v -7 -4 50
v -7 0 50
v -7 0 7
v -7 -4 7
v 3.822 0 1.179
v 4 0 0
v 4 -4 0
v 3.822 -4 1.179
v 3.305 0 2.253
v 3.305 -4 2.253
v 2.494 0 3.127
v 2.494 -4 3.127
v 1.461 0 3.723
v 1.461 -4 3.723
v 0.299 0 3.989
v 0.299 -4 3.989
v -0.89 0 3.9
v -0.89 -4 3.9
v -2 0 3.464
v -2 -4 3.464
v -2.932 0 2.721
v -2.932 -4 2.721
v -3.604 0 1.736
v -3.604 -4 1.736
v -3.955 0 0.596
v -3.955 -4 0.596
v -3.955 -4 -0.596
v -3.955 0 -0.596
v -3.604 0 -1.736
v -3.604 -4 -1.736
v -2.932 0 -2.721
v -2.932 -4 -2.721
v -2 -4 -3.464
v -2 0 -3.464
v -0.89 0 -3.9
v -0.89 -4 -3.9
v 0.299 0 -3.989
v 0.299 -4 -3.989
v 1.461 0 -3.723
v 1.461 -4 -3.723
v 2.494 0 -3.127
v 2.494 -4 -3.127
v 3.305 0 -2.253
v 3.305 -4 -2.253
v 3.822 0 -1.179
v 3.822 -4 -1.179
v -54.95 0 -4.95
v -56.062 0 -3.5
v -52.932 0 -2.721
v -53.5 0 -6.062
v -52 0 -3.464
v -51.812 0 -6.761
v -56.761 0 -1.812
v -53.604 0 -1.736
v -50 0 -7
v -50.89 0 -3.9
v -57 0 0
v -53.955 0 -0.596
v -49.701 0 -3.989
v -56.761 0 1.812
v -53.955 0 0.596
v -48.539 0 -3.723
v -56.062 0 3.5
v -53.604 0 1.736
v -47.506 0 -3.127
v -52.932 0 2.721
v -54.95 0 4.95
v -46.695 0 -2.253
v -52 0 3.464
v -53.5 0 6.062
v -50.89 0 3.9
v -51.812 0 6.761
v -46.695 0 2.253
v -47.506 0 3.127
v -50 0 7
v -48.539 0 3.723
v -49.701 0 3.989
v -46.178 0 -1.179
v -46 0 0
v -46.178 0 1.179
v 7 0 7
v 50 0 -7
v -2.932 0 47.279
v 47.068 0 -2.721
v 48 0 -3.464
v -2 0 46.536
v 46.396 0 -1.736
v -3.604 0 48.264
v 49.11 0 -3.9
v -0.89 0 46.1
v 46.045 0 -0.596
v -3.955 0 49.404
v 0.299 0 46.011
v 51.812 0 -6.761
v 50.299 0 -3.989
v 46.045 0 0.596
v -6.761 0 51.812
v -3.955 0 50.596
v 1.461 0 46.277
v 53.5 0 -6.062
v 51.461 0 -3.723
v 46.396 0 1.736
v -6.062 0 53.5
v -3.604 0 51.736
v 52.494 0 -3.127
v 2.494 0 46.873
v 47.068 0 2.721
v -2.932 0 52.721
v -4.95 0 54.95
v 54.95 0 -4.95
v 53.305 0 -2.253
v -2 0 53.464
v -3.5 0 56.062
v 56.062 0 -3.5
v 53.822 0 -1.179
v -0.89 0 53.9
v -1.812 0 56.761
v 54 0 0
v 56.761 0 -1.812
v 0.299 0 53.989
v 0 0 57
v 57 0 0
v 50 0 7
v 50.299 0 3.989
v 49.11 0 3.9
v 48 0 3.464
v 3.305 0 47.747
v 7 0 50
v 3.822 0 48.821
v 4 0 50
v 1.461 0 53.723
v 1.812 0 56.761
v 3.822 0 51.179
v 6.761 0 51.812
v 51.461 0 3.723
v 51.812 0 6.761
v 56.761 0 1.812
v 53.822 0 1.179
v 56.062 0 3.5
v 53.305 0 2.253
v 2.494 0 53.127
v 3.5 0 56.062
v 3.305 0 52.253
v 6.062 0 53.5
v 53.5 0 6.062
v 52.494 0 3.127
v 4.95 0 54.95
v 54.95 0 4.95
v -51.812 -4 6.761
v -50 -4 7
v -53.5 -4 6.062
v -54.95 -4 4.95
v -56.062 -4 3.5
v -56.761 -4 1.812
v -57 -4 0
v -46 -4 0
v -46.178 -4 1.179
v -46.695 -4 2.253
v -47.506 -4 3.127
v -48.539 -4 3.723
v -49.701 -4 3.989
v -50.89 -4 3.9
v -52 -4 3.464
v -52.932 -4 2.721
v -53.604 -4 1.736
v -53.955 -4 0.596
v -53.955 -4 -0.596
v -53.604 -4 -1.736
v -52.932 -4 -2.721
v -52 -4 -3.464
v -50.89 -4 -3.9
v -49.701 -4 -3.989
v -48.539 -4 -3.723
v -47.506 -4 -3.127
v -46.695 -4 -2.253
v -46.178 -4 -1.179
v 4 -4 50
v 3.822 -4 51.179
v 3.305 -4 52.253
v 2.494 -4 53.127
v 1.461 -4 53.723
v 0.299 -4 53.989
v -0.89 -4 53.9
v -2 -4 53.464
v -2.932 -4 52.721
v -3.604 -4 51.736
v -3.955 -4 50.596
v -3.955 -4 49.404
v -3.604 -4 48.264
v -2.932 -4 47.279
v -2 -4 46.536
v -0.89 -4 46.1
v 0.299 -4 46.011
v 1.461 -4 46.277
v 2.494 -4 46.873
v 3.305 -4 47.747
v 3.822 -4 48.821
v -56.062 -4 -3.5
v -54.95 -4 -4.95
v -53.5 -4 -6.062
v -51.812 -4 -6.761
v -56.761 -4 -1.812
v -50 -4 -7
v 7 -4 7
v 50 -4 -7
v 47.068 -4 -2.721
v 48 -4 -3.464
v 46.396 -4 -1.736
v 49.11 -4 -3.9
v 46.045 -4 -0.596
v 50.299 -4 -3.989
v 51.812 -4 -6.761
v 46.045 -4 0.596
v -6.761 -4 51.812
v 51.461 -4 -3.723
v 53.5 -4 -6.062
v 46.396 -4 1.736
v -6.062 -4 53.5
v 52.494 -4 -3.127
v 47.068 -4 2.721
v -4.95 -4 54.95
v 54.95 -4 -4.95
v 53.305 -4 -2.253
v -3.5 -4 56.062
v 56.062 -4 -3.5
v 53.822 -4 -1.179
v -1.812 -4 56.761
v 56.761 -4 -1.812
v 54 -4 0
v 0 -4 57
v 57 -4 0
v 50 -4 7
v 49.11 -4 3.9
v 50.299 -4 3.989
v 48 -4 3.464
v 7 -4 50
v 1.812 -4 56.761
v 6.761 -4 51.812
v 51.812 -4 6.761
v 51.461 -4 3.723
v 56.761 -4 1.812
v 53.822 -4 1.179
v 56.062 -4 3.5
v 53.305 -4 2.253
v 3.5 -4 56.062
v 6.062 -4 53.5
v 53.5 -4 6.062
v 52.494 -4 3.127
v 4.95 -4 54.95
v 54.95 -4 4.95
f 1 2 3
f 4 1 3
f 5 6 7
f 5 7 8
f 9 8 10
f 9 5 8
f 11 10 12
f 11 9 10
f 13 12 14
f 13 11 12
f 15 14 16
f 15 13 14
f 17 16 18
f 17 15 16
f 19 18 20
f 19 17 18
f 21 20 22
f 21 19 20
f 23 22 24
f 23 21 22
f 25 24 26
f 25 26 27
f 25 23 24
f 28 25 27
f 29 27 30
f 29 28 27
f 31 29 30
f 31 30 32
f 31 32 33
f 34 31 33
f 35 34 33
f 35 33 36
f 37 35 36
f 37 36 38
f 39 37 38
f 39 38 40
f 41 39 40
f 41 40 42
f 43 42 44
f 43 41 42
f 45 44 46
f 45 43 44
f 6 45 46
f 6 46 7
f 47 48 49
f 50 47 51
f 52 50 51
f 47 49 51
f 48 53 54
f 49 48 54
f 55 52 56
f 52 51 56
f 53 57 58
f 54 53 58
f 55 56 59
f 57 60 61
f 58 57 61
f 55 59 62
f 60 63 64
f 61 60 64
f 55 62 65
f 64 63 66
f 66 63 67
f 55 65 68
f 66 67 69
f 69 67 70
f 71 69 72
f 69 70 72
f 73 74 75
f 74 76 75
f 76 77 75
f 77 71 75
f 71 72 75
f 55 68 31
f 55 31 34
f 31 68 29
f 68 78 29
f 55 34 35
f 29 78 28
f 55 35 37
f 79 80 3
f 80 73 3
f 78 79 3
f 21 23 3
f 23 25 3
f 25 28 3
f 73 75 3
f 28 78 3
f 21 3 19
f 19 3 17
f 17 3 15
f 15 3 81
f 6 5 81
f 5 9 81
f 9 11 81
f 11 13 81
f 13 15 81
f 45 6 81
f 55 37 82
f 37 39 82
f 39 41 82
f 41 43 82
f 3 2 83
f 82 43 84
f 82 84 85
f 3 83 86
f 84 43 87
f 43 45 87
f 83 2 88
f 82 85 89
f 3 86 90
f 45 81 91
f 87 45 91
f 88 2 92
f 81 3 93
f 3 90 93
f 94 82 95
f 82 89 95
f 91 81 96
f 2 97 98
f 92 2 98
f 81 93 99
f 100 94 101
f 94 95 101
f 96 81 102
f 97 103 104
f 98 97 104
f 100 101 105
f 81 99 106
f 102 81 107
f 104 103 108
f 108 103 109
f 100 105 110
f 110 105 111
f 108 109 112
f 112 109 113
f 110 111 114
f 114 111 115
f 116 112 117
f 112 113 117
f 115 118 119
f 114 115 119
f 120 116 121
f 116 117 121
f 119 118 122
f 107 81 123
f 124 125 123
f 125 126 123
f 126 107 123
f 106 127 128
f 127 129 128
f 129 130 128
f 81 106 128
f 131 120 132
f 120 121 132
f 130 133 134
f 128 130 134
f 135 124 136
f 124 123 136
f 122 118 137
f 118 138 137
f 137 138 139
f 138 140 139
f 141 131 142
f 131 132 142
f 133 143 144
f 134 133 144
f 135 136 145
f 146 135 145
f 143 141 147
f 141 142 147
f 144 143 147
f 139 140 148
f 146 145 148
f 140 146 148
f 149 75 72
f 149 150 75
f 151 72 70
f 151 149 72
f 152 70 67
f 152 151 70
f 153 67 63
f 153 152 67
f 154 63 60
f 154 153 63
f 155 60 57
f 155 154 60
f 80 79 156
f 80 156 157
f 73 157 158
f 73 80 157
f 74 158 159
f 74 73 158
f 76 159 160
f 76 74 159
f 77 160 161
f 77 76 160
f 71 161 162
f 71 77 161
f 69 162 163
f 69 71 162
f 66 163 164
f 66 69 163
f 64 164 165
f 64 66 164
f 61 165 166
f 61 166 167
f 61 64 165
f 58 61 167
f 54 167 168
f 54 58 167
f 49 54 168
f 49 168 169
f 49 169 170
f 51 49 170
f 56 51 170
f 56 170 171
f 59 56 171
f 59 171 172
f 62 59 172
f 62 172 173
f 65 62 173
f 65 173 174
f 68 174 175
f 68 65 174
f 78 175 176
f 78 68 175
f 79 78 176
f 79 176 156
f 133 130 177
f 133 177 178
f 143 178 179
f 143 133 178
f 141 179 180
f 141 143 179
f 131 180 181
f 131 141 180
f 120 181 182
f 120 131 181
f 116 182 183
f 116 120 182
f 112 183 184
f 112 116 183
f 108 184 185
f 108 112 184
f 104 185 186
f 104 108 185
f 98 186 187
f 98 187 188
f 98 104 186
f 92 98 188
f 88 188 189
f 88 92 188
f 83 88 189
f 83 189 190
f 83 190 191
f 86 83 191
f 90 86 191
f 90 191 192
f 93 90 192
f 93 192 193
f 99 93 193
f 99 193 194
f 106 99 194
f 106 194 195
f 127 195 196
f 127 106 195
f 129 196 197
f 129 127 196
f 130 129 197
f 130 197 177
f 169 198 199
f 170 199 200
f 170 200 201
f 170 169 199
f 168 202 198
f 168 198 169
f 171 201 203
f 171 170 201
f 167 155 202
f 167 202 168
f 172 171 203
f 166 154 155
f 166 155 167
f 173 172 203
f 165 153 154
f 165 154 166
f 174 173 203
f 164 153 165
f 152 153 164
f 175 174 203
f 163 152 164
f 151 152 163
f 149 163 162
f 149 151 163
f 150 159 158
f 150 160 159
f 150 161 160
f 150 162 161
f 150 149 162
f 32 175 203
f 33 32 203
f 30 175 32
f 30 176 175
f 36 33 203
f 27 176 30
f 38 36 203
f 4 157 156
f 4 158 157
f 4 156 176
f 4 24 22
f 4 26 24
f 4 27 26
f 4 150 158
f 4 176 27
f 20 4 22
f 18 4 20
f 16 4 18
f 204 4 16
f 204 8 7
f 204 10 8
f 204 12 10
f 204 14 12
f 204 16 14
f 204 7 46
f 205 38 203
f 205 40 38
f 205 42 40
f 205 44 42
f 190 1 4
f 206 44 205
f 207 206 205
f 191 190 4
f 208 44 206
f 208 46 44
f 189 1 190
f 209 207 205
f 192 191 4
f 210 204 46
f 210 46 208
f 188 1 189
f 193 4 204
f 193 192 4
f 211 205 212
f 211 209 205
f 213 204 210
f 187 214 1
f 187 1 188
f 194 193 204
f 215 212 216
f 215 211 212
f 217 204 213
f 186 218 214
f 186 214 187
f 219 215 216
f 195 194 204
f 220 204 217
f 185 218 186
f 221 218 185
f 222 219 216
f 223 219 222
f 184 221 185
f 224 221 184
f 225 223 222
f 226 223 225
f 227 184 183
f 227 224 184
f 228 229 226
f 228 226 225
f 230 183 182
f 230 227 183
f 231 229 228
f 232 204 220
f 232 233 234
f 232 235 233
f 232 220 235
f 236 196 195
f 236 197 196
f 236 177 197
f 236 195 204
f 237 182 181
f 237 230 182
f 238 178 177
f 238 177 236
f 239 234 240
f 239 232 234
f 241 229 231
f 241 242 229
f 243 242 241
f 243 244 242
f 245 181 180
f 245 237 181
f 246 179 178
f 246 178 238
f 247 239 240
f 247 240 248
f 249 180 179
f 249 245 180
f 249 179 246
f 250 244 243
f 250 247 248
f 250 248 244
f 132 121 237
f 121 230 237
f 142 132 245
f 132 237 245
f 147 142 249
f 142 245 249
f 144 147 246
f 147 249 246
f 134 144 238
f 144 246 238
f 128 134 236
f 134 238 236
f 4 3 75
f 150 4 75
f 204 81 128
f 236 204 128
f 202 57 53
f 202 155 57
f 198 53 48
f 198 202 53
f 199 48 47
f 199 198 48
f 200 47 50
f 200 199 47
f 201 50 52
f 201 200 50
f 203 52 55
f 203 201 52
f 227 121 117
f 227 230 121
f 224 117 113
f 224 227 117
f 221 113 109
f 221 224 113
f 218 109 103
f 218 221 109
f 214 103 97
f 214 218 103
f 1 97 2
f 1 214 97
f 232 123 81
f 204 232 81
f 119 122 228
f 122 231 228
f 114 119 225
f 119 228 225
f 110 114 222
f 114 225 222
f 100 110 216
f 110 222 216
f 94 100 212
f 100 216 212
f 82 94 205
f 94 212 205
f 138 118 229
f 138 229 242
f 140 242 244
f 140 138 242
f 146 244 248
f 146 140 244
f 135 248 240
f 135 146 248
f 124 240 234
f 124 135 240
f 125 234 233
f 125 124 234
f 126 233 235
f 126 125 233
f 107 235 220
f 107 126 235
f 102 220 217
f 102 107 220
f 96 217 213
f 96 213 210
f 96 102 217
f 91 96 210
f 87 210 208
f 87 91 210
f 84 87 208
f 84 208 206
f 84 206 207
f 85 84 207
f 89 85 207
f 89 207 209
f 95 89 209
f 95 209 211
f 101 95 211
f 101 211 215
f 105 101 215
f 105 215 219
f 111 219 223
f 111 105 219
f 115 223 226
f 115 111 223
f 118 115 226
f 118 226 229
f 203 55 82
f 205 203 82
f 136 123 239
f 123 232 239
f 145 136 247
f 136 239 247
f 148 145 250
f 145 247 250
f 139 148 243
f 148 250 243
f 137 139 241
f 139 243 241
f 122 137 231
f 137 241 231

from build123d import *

# Parameters (mm, degrees)
F0_R     = 4
F1_DEPTH = 4
F2_R     = 6.99999


# Not quite as in the source:
# - a fillet or chamfer is up to 0.001 mm smaller than in the source, because OpenCascade refuses the exact size
# - a feature names something its author has since deleted; it is built from what else it names


with BuildPart() as f1:
    # F0 (on Front) → F1 (new body)
    with BuildSketch(Plane.XZ):
        Polygon((7, 57), (-7, 57), (-7, 7), (-57, 7), (-57, -7), (57, -7), (57, 7), (7, 7), align=None)
        with Locations((-50, 0)):
            Circle(F0_R, mode=Mode.SUBTRACT)
        Circle(F0_R, mode=Mode.SUBTRACT)
        with Locations((50, 0)):
            Circle(F0_R, mode=Mode.SUBTRACT)
        with Locations((0, 50)):
            Circle(F0_R, mode=Mode.SUBTRACT)
    extrude(amount=F1_DEPTH)

    # F2 (radius 7 in the source; OpenCascade refuses exactly that, so slightly less here)
    f2_edges = [f1.edges().sort_by_distance(p)[0] for p in [
        (57, -2, -7),
        (57, -2, 7),
        (7, -2, 57),
        (-7, -2, 57),
        (-57, -2, 7),
        (-57, -2, -7),
    ]]
    fillet(f2_edges, radius=F2_R)


solid = f1.part
